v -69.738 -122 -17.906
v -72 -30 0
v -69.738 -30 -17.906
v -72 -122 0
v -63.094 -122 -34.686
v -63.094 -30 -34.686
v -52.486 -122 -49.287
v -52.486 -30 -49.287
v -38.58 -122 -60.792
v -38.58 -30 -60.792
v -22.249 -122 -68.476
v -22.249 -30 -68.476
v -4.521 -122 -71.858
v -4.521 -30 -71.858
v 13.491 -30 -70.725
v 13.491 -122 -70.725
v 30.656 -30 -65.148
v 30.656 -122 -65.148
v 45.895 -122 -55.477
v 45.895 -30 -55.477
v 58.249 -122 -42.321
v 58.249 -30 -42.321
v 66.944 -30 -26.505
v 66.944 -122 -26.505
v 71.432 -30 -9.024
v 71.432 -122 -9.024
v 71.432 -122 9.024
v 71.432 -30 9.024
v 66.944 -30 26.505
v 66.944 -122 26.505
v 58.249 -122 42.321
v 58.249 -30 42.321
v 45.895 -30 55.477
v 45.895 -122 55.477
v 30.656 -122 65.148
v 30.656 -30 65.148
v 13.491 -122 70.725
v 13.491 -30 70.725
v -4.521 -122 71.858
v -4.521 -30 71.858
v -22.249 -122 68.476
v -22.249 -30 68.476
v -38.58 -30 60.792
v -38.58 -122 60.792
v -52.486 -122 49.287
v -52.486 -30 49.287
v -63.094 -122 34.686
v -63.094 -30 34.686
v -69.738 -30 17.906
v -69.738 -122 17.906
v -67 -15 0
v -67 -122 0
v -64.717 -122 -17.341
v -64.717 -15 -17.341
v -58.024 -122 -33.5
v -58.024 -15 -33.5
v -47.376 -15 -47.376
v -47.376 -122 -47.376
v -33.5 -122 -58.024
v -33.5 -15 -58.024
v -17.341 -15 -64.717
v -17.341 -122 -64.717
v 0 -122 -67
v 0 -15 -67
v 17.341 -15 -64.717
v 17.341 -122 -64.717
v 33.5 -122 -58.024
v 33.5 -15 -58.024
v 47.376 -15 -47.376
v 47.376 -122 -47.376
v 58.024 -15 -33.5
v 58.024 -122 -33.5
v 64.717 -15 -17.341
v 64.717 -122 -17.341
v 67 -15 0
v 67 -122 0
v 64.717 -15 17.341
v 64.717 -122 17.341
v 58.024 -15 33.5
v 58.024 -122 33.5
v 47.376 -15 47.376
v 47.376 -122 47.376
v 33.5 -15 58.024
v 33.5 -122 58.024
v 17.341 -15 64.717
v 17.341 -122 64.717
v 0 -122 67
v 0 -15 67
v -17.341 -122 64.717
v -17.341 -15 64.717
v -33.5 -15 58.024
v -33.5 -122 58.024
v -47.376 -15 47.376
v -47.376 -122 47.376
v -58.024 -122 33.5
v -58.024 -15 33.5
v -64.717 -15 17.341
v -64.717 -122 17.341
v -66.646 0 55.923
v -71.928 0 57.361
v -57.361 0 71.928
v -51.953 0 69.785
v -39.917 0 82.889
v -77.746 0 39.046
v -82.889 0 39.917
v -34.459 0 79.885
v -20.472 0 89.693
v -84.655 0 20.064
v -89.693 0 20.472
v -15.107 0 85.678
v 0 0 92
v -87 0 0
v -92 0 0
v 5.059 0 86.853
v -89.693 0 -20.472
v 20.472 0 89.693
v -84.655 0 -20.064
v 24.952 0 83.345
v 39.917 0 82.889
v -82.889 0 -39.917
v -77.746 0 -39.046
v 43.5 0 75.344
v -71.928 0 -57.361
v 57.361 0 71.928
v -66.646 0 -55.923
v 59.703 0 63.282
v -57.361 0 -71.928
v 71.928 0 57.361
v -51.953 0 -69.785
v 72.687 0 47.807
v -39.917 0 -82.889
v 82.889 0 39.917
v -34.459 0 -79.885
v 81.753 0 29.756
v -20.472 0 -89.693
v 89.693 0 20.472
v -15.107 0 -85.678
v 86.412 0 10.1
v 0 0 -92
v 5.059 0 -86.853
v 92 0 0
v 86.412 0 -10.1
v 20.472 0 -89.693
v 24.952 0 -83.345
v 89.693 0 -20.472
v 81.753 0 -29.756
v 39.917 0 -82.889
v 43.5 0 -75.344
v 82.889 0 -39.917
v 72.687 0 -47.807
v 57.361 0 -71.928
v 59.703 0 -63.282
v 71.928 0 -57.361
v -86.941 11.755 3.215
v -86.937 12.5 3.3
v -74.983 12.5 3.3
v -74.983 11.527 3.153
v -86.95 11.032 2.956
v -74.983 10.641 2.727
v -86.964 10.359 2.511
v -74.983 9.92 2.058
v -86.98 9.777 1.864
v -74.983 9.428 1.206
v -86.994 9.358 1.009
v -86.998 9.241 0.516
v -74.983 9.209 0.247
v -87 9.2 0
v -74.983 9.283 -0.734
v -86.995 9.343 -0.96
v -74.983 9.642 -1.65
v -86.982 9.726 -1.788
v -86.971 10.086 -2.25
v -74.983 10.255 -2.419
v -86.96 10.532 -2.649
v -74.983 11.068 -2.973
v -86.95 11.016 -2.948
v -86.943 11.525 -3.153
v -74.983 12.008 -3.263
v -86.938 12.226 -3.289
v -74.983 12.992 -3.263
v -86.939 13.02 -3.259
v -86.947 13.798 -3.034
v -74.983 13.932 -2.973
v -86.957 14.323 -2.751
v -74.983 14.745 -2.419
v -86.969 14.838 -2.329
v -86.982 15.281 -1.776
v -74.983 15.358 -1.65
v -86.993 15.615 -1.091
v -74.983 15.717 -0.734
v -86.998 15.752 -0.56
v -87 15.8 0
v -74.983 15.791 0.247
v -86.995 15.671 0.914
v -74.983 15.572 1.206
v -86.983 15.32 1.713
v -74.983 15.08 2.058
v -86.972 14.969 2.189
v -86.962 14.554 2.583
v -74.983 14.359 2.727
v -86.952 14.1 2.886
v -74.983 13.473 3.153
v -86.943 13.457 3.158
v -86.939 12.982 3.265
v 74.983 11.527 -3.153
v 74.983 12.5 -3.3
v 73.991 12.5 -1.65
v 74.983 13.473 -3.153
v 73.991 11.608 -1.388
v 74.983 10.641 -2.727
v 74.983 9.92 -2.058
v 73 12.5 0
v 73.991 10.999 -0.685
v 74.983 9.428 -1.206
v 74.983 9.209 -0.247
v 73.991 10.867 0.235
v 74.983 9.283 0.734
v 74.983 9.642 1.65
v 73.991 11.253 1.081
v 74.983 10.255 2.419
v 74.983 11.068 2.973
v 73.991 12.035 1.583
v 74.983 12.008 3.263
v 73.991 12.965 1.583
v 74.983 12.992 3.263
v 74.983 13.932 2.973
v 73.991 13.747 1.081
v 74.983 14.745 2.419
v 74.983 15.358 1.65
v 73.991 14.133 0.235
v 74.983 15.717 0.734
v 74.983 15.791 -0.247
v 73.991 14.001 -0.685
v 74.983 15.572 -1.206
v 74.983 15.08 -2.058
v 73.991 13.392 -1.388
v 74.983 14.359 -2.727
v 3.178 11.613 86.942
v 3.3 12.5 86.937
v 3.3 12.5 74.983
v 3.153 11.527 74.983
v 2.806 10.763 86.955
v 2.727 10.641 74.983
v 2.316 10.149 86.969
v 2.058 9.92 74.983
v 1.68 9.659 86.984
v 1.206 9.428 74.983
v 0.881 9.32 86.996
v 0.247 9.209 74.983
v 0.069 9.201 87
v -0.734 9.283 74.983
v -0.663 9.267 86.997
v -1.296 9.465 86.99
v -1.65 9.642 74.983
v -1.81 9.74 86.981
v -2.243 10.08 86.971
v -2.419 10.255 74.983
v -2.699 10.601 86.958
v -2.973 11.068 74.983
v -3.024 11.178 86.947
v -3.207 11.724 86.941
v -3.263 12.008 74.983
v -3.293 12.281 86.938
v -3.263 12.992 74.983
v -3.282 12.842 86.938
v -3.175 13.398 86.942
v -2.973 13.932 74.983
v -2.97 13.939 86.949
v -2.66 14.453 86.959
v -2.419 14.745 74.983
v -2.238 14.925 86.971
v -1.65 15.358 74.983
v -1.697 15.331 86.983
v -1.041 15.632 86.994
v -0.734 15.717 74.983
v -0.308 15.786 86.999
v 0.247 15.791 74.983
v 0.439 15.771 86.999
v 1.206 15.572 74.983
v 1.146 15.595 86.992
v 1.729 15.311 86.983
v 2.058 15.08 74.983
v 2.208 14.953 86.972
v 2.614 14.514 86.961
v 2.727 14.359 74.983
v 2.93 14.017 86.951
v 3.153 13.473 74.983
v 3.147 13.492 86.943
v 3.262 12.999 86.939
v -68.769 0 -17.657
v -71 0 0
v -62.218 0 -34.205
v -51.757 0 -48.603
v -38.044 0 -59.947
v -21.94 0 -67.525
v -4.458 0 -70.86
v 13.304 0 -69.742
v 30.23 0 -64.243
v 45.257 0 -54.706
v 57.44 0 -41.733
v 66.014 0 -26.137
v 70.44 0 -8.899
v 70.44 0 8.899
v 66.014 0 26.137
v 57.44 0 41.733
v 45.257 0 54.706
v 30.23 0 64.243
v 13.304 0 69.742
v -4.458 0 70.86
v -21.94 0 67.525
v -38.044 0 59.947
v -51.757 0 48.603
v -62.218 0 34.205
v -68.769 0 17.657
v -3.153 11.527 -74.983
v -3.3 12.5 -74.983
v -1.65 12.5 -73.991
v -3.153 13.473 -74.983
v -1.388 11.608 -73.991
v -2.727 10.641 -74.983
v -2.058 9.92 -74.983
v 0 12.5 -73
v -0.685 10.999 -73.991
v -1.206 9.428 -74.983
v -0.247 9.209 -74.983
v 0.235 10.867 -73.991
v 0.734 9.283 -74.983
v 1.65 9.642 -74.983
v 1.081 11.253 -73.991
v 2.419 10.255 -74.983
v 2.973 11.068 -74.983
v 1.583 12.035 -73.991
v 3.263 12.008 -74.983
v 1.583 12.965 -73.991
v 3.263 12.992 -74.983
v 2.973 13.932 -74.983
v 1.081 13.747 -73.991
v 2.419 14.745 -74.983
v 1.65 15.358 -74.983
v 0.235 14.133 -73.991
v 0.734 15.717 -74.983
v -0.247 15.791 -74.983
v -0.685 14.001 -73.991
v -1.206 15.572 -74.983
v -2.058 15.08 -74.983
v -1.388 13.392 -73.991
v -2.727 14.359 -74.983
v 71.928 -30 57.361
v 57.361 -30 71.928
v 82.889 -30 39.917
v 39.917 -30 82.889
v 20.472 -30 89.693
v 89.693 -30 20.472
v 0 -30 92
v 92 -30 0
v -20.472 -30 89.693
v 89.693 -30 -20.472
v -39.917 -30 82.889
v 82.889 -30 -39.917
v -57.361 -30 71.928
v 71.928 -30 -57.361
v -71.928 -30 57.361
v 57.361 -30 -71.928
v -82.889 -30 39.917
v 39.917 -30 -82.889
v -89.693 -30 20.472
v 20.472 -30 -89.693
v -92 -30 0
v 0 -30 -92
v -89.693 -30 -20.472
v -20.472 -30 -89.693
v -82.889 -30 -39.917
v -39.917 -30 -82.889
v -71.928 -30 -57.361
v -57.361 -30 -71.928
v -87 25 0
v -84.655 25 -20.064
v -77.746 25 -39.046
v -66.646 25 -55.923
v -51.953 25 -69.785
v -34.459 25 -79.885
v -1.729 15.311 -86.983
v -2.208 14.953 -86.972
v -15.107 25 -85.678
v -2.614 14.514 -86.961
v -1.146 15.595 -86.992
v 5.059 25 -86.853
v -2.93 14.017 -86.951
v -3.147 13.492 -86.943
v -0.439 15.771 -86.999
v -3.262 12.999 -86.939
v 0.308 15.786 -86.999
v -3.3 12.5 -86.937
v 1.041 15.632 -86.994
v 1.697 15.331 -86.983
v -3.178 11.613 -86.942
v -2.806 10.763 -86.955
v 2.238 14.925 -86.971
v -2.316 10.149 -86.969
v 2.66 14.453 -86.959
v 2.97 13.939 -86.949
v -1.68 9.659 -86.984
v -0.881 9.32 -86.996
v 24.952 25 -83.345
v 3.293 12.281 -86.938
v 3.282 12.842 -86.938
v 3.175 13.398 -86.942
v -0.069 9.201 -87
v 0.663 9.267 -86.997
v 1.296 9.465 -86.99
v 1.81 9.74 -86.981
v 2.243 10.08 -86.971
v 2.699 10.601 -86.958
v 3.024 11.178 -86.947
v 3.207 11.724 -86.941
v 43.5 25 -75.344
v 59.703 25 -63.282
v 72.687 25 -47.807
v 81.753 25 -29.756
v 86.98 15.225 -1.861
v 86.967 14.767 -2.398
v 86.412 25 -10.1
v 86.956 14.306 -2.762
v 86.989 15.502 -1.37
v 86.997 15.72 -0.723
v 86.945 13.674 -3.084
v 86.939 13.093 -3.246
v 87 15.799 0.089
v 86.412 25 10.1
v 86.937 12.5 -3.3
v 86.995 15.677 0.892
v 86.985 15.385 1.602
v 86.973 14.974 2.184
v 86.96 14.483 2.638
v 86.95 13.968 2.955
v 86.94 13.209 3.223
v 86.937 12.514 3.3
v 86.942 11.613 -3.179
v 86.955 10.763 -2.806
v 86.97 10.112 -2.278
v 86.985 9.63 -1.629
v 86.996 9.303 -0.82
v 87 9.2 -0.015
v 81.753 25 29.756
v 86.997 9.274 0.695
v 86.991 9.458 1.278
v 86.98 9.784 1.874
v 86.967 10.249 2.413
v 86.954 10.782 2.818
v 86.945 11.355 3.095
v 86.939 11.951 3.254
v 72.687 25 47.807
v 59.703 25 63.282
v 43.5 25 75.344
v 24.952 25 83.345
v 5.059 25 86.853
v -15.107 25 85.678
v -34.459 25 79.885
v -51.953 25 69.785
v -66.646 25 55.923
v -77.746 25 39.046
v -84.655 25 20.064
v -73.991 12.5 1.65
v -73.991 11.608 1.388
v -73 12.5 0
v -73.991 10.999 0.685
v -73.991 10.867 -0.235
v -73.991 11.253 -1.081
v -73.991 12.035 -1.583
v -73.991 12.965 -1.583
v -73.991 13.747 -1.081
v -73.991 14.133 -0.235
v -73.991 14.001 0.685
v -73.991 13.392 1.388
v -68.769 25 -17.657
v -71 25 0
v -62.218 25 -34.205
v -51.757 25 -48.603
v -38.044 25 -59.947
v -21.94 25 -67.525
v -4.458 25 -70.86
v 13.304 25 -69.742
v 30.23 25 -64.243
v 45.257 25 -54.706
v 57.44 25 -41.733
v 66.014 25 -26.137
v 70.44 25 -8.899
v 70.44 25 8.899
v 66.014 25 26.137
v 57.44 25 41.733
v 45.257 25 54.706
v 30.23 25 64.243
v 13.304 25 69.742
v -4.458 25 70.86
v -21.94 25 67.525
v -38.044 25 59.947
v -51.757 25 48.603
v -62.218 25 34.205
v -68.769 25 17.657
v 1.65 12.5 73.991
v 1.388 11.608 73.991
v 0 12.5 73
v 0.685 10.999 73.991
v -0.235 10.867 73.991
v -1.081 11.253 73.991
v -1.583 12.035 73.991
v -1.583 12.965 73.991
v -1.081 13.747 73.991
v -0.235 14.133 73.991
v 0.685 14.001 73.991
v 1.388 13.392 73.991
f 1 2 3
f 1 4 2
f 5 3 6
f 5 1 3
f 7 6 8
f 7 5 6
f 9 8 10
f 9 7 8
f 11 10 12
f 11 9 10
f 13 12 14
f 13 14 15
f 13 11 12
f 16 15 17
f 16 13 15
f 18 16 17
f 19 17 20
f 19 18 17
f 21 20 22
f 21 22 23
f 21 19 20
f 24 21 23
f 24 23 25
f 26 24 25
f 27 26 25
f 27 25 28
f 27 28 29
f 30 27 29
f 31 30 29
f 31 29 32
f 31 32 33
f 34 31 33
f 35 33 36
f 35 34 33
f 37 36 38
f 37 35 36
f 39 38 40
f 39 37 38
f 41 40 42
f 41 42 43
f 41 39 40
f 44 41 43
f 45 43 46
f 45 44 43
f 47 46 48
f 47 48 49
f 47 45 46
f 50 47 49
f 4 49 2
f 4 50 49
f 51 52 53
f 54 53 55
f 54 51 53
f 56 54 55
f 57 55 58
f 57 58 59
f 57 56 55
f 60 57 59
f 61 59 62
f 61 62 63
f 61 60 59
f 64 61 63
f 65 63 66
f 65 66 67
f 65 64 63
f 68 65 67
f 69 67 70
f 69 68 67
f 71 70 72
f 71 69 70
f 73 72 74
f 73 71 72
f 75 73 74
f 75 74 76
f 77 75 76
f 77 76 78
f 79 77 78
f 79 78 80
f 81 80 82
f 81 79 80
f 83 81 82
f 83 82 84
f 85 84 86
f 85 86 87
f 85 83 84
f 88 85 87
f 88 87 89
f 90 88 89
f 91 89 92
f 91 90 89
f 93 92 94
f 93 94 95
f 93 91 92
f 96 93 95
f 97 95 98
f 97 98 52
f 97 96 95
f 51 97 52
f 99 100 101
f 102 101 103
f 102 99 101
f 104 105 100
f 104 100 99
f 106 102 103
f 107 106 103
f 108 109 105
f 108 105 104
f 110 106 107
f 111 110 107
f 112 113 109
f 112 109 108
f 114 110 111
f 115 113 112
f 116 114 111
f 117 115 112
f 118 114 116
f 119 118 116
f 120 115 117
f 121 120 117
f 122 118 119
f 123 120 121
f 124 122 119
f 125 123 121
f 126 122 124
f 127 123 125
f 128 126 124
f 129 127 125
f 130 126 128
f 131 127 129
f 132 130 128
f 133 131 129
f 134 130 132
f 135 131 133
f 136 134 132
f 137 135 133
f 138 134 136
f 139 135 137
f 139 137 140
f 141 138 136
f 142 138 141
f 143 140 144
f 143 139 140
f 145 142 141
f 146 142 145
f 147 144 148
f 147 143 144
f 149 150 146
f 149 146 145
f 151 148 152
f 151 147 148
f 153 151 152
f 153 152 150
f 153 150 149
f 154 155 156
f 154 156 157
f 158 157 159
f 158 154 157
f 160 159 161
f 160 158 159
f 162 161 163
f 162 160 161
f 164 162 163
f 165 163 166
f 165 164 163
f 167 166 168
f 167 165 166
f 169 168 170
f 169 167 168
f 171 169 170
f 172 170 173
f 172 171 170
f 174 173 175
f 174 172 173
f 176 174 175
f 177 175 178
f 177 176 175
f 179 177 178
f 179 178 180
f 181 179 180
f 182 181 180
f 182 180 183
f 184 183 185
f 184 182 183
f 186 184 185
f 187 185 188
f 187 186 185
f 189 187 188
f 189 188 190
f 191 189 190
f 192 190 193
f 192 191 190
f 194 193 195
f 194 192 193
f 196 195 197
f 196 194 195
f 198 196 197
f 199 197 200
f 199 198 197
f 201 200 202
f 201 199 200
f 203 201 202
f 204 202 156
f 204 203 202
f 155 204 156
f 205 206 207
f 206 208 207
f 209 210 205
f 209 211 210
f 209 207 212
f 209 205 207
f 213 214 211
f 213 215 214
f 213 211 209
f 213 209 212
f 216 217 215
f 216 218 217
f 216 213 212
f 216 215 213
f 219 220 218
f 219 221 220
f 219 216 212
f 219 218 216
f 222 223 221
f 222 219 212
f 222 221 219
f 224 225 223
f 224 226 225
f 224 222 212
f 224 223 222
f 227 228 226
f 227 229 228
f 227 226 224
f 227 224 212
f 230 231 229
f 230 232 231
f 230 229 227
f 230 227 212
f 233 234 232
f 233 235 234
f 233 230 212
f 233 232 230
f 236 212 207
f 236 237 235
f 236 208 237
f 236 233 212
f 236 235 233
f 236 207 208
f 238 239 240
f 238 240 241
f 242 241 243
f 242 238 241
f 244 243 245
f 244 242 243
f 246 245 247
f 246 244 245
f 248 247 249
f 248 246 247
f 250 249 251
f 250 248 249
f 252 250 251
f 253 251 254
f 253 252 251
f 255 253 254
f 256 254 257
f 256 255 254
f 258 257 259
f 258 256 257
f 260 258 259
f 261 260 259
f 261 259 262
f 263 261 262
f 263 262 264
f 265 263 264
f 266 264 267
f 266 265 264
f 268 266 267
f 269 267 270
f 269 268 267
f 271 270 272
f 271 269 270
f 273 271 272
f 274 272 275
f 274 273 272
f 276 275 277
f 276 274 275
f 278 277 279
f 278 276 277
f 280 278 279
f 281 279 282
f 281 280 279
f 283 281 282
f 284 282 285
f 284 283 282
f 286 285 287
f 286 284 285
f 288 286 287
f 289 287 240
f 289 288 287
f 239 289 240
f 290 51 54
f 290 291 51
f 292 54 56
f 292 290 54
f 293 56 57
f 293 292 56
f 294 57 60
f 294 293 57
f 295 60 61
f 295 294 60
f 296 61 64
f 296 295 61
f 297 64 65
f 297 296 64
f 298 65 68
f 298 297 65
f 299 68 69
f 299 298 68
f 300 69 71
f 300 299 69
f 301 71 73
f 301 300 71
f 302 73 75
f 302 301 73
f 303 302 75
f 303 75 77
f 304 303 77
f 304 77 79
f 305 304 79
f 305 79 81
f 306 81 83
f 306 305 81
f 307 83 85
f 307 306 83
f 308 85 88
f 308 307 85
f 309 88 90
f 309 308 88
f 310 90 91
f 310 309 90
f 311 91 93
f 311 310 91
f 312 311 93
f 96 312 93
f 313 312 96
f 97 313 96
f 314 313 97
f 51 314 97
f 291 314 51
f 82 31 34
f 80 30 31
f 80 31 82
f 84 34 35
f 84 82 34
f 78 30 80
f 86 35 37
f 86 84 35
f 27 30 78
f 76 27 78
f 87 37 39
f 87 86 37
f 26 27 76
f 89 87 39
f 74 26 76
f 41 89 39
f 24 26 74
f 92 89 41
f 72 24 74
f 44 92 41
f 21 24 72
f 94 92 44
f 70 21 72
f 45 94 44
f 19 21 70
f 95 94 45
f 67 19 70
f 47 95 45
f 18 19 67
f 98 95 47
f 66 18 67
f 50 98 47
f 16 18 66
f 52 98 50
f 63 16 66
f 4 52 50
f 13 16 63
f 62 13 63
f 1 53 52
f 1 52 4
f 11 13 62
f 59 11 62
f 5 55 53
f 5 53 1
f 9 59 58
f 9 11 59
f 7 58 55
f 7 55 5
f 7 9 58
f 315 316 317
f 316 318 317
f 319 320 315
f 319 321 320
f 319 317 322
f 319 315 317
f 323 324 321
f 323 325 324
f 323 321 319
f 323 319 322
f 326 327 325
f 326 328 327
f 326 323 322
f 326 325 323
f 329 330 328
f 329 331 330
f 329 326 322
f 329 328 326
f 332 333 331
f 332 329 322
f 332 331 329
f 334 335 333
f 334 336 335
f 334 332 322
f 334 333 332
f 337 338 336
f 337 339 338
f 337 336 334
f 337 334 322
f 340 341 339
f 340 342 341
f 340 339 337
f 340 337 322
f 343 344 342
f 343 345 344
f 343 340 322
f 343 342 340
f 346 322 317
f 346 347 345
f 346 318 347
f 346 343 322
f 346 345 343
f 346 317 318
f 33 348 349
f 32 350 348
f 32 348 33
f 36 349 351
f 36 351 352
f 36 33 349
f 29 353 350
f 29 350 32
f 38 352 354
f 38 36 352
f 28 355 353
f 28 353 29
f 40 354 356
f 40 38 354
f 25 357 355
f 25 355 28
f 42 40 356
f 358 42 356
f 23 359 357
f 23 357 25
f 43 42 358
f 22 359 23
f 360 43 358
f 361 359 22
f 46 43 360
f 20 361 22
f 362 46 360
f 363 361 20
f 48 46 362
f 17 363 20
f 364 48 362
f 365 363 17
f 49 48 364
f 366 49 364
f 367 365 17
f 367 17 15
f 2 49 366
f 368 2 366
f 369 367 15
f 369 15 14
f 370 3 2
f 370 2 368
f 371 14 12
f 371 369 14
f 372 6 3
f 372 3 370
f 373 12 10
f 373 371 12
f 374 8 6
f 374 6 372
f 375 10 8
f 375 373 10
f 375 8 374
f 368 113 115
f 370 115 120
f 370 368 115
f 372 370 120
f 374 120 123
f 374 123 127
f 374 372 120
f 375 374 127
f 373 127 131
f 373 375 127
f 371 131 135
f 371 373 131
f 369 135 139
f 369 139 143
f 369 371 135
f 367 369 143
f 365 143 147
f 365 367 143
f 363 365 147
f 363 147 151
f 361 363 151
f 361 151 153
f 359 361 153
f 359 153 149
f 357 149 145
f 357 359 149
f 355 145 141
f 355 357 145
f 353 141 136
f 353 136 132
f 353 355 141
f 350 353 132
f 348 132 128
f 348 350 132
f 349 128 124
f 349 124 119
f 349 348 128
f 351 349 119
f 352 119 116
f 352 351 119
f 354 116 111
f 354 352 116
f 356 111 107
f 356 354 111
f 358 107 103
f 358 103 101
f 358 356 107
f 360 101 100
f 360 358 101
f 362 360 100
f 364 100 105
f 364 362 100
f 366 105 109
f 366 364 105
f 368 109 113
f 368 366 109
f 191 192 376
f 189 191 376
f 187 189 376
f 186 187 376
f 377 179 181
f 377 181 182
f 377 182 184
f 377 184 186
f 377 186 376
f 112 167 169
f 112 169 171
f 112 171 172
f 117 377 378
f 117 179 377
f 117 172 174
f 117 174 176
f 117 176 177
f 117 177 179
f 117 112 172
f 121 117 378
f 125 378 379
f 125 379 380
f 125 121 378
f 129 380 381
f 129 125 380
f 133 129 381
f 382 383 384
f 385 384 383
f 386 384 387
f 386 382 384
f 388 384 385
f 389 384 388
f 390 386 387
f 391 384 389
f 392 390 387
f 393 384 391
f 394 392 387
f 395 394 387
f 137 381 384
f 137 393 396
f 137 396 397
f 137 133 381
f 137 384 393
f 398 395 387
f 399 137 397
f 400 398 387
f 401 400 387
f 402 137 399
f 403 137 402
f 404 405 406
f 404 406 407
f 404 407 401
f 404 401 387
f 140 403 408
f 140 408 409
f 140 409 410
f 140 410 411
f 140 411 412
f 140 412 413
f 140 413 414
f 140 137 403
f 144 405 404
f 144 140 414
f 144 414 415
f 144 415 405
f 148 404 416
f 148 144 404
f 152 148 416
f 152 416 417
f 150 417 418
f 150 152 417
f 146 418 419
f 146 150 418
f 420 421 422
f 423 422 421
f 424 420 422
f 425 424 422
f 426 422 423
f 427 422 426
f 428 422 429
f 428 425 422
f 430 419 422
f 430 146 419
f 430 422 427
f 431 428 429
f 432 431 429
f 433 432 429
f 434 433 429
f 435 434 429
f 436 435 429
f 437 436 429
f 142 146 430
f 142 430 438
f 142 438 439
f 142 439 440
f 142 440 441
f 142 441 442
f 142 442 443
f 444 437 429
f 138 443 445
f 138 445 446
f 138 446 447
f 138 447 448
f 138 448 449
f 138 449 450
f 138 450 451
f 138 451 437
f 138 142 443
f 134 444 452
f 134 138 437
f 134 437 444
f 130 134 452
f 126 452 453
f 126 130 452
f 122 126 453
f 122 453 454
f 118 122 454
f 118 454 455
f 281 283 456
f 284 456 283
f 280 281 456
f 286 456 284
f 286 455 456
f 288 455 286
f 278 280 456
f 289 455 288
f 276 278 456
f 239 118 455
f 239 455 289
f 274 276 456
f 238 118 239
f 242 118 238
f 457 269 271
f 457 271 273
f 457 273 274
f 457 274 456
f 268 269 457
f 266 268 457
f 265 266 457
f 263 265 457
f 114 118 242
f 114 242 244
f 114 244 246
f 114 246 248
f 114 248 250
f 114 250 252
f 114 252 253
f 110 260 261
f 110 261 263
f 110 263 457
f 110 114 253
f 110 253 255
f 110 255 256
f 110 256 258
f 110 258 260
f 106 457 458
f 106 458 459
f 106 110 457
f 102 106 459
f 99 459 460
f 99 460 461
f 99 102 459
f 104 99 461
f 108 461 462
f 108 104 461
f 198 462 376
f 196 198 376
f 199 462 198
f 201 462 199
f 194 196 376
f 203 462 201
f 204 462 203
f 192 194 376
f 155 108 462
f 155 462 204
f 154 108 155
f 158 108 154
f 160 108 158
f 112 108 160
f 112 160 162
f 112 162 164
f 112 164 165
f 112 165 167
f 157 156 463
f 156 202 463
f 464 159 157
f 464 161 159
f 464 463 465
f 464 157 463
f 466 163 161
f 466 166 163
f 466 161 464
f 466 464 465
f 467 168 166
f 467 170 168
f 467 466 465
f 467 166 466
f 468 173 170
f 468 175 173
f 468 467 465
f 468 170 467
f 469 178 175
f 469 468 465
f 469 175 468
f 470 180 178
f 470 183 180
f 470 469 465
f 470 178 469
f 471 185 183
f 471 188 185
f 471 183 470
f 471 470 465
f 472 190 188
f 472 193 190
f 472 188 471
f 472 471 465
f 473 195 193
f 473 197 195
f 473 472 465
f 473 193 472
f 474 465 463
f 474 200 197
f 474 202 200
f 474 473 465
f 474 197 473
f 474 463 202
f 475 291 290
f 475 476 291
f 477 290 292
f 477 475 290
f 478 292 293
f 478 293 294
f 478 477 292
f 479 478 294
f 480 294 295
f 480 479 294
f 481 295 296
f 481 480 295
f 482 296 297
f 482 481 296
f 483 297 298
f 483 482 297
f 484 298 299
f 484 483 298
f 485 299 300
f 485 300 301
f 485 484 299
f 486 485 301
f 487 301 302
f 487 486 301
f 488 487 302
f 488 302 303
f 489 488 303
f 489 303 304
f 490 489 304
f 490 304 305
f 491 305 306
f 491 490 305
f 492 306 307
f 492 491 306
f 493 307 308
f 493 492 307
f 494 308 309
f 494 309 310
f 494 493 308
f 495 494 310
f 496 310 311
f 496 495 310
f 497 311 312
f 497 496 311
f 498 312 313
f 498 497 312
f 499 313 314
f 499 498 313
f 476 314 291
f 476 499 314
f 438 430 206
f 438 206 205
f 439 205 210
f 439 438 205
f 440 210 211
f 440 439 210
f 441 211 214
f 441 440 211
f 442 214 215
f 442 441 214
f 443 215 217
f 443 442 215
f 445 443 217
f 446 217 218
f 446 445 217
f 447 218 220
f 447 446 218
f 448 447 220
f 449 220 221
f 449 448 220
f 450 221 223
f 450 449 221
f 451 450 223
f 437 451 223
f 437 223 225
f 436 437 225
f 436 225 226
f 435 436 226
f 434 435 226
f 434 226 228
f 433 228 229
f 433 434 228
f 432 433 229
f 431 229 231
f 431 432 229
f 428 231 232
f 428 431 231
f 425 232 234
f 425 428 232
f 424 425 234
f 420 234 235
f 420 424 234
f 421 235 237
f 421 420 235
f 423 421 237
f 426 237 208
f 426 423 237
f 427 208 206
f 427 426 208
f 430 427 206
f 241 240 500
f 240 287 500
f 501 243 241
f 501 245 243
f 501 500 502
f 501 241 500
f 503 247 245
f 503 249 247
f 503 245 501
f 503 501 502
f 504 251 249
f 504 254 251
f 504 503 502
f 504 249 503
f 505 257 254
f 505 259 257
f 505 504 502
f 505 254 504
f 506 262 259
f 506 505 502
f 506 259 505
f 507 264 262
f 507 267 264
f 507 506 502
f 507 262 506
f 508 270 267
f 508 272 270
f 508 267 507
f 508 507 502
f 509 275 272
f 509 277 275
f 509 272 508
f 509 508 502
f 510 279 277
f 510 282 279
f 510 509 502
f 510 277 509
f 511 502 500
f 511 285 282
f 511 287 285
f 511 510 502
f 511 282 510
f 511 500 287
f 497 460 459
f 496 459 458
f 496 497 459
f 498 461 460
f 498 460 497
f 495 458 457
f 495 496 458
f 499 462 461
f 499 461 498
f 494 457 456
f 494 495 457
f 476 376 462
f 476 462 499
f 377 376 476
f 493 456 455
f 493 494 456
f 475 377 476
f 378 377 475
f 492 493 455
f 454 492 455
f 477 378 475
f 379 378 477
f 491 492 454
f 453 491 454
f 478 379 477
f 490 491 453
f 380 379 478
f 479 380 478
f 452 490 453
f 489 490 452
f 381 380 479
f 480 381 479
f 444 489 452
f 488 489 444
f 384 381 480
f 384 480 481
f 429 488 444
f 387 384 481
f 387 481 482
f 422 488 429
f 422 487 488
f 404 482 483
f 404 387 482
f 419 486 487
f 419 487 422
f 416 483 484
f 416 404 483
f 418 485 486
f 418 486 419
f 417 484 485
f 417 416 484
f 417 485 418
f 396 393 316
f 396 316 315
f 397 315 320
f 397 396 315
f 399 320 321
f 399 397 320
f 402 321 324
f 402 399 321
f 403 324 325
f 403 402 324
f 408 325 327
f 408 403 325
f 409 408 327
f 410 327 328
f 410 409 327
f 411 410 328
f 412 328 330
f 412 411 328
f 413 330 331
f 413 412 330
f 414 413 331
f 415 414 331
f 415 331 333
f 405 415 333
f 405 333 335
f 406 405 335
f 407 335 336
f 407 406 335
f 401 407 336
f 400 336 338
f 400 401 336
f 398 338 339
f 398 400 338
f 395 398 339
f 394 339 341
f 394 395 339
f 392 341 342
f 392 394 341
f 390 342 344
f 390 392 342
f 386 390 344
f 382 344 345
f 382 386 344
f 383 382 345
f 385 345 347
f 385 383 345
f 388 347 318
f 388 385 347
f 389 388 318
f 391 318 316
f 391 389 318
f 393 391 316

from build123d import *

# Parameters (mm, degrees)
CIRPATTERN1_COUNT = 4


with BuildPart() as part:
    # Sketch1 → Revolve1 (revolve)
    with BuildSketch(Plane.XY):
        Polygon((-71, 0), (-71, 25), (-87, 25), (-87, 0), (-92, 0), (-92, -30), (-72, -30), (-72, -122), (-67, -122), (-67, -15), align=None)
    revolve(axis=Axis((0, 25, 0), (0, -1, 0)))

    # Sketch6 → M6 Clearance Hole2 (revolve, cut)
    with BuildSketch(Plane(origin=(-87, 12.5, 0), x_dir=(0, 0, 1), z_dir=(0, 1, 0))):
        Polygon((0, 0), (0, 14), (3.3, 12.017159957), (3.3, 0), align=None)
    m6_clearance_hole2 = revolve(axis=Axis((-93.35, 12.5, 0), (1, 0, 0)), mode=Mode.SUBTRACT)

    # CirPattern1: M6 Clearance Hole2 ×4 about axis
    cirpattern1_axis = Axis((0, 25, 0), (0, 1, 0))
    for i in range(1, CIRPATTERN1_COUNT):
        add(m6_clearance_hole2.rotate(cirpattern1_axis, i * 360 / CIRPATTERN1_COUNT), mode=Mode.SUBTRACT)


solid = part.part
